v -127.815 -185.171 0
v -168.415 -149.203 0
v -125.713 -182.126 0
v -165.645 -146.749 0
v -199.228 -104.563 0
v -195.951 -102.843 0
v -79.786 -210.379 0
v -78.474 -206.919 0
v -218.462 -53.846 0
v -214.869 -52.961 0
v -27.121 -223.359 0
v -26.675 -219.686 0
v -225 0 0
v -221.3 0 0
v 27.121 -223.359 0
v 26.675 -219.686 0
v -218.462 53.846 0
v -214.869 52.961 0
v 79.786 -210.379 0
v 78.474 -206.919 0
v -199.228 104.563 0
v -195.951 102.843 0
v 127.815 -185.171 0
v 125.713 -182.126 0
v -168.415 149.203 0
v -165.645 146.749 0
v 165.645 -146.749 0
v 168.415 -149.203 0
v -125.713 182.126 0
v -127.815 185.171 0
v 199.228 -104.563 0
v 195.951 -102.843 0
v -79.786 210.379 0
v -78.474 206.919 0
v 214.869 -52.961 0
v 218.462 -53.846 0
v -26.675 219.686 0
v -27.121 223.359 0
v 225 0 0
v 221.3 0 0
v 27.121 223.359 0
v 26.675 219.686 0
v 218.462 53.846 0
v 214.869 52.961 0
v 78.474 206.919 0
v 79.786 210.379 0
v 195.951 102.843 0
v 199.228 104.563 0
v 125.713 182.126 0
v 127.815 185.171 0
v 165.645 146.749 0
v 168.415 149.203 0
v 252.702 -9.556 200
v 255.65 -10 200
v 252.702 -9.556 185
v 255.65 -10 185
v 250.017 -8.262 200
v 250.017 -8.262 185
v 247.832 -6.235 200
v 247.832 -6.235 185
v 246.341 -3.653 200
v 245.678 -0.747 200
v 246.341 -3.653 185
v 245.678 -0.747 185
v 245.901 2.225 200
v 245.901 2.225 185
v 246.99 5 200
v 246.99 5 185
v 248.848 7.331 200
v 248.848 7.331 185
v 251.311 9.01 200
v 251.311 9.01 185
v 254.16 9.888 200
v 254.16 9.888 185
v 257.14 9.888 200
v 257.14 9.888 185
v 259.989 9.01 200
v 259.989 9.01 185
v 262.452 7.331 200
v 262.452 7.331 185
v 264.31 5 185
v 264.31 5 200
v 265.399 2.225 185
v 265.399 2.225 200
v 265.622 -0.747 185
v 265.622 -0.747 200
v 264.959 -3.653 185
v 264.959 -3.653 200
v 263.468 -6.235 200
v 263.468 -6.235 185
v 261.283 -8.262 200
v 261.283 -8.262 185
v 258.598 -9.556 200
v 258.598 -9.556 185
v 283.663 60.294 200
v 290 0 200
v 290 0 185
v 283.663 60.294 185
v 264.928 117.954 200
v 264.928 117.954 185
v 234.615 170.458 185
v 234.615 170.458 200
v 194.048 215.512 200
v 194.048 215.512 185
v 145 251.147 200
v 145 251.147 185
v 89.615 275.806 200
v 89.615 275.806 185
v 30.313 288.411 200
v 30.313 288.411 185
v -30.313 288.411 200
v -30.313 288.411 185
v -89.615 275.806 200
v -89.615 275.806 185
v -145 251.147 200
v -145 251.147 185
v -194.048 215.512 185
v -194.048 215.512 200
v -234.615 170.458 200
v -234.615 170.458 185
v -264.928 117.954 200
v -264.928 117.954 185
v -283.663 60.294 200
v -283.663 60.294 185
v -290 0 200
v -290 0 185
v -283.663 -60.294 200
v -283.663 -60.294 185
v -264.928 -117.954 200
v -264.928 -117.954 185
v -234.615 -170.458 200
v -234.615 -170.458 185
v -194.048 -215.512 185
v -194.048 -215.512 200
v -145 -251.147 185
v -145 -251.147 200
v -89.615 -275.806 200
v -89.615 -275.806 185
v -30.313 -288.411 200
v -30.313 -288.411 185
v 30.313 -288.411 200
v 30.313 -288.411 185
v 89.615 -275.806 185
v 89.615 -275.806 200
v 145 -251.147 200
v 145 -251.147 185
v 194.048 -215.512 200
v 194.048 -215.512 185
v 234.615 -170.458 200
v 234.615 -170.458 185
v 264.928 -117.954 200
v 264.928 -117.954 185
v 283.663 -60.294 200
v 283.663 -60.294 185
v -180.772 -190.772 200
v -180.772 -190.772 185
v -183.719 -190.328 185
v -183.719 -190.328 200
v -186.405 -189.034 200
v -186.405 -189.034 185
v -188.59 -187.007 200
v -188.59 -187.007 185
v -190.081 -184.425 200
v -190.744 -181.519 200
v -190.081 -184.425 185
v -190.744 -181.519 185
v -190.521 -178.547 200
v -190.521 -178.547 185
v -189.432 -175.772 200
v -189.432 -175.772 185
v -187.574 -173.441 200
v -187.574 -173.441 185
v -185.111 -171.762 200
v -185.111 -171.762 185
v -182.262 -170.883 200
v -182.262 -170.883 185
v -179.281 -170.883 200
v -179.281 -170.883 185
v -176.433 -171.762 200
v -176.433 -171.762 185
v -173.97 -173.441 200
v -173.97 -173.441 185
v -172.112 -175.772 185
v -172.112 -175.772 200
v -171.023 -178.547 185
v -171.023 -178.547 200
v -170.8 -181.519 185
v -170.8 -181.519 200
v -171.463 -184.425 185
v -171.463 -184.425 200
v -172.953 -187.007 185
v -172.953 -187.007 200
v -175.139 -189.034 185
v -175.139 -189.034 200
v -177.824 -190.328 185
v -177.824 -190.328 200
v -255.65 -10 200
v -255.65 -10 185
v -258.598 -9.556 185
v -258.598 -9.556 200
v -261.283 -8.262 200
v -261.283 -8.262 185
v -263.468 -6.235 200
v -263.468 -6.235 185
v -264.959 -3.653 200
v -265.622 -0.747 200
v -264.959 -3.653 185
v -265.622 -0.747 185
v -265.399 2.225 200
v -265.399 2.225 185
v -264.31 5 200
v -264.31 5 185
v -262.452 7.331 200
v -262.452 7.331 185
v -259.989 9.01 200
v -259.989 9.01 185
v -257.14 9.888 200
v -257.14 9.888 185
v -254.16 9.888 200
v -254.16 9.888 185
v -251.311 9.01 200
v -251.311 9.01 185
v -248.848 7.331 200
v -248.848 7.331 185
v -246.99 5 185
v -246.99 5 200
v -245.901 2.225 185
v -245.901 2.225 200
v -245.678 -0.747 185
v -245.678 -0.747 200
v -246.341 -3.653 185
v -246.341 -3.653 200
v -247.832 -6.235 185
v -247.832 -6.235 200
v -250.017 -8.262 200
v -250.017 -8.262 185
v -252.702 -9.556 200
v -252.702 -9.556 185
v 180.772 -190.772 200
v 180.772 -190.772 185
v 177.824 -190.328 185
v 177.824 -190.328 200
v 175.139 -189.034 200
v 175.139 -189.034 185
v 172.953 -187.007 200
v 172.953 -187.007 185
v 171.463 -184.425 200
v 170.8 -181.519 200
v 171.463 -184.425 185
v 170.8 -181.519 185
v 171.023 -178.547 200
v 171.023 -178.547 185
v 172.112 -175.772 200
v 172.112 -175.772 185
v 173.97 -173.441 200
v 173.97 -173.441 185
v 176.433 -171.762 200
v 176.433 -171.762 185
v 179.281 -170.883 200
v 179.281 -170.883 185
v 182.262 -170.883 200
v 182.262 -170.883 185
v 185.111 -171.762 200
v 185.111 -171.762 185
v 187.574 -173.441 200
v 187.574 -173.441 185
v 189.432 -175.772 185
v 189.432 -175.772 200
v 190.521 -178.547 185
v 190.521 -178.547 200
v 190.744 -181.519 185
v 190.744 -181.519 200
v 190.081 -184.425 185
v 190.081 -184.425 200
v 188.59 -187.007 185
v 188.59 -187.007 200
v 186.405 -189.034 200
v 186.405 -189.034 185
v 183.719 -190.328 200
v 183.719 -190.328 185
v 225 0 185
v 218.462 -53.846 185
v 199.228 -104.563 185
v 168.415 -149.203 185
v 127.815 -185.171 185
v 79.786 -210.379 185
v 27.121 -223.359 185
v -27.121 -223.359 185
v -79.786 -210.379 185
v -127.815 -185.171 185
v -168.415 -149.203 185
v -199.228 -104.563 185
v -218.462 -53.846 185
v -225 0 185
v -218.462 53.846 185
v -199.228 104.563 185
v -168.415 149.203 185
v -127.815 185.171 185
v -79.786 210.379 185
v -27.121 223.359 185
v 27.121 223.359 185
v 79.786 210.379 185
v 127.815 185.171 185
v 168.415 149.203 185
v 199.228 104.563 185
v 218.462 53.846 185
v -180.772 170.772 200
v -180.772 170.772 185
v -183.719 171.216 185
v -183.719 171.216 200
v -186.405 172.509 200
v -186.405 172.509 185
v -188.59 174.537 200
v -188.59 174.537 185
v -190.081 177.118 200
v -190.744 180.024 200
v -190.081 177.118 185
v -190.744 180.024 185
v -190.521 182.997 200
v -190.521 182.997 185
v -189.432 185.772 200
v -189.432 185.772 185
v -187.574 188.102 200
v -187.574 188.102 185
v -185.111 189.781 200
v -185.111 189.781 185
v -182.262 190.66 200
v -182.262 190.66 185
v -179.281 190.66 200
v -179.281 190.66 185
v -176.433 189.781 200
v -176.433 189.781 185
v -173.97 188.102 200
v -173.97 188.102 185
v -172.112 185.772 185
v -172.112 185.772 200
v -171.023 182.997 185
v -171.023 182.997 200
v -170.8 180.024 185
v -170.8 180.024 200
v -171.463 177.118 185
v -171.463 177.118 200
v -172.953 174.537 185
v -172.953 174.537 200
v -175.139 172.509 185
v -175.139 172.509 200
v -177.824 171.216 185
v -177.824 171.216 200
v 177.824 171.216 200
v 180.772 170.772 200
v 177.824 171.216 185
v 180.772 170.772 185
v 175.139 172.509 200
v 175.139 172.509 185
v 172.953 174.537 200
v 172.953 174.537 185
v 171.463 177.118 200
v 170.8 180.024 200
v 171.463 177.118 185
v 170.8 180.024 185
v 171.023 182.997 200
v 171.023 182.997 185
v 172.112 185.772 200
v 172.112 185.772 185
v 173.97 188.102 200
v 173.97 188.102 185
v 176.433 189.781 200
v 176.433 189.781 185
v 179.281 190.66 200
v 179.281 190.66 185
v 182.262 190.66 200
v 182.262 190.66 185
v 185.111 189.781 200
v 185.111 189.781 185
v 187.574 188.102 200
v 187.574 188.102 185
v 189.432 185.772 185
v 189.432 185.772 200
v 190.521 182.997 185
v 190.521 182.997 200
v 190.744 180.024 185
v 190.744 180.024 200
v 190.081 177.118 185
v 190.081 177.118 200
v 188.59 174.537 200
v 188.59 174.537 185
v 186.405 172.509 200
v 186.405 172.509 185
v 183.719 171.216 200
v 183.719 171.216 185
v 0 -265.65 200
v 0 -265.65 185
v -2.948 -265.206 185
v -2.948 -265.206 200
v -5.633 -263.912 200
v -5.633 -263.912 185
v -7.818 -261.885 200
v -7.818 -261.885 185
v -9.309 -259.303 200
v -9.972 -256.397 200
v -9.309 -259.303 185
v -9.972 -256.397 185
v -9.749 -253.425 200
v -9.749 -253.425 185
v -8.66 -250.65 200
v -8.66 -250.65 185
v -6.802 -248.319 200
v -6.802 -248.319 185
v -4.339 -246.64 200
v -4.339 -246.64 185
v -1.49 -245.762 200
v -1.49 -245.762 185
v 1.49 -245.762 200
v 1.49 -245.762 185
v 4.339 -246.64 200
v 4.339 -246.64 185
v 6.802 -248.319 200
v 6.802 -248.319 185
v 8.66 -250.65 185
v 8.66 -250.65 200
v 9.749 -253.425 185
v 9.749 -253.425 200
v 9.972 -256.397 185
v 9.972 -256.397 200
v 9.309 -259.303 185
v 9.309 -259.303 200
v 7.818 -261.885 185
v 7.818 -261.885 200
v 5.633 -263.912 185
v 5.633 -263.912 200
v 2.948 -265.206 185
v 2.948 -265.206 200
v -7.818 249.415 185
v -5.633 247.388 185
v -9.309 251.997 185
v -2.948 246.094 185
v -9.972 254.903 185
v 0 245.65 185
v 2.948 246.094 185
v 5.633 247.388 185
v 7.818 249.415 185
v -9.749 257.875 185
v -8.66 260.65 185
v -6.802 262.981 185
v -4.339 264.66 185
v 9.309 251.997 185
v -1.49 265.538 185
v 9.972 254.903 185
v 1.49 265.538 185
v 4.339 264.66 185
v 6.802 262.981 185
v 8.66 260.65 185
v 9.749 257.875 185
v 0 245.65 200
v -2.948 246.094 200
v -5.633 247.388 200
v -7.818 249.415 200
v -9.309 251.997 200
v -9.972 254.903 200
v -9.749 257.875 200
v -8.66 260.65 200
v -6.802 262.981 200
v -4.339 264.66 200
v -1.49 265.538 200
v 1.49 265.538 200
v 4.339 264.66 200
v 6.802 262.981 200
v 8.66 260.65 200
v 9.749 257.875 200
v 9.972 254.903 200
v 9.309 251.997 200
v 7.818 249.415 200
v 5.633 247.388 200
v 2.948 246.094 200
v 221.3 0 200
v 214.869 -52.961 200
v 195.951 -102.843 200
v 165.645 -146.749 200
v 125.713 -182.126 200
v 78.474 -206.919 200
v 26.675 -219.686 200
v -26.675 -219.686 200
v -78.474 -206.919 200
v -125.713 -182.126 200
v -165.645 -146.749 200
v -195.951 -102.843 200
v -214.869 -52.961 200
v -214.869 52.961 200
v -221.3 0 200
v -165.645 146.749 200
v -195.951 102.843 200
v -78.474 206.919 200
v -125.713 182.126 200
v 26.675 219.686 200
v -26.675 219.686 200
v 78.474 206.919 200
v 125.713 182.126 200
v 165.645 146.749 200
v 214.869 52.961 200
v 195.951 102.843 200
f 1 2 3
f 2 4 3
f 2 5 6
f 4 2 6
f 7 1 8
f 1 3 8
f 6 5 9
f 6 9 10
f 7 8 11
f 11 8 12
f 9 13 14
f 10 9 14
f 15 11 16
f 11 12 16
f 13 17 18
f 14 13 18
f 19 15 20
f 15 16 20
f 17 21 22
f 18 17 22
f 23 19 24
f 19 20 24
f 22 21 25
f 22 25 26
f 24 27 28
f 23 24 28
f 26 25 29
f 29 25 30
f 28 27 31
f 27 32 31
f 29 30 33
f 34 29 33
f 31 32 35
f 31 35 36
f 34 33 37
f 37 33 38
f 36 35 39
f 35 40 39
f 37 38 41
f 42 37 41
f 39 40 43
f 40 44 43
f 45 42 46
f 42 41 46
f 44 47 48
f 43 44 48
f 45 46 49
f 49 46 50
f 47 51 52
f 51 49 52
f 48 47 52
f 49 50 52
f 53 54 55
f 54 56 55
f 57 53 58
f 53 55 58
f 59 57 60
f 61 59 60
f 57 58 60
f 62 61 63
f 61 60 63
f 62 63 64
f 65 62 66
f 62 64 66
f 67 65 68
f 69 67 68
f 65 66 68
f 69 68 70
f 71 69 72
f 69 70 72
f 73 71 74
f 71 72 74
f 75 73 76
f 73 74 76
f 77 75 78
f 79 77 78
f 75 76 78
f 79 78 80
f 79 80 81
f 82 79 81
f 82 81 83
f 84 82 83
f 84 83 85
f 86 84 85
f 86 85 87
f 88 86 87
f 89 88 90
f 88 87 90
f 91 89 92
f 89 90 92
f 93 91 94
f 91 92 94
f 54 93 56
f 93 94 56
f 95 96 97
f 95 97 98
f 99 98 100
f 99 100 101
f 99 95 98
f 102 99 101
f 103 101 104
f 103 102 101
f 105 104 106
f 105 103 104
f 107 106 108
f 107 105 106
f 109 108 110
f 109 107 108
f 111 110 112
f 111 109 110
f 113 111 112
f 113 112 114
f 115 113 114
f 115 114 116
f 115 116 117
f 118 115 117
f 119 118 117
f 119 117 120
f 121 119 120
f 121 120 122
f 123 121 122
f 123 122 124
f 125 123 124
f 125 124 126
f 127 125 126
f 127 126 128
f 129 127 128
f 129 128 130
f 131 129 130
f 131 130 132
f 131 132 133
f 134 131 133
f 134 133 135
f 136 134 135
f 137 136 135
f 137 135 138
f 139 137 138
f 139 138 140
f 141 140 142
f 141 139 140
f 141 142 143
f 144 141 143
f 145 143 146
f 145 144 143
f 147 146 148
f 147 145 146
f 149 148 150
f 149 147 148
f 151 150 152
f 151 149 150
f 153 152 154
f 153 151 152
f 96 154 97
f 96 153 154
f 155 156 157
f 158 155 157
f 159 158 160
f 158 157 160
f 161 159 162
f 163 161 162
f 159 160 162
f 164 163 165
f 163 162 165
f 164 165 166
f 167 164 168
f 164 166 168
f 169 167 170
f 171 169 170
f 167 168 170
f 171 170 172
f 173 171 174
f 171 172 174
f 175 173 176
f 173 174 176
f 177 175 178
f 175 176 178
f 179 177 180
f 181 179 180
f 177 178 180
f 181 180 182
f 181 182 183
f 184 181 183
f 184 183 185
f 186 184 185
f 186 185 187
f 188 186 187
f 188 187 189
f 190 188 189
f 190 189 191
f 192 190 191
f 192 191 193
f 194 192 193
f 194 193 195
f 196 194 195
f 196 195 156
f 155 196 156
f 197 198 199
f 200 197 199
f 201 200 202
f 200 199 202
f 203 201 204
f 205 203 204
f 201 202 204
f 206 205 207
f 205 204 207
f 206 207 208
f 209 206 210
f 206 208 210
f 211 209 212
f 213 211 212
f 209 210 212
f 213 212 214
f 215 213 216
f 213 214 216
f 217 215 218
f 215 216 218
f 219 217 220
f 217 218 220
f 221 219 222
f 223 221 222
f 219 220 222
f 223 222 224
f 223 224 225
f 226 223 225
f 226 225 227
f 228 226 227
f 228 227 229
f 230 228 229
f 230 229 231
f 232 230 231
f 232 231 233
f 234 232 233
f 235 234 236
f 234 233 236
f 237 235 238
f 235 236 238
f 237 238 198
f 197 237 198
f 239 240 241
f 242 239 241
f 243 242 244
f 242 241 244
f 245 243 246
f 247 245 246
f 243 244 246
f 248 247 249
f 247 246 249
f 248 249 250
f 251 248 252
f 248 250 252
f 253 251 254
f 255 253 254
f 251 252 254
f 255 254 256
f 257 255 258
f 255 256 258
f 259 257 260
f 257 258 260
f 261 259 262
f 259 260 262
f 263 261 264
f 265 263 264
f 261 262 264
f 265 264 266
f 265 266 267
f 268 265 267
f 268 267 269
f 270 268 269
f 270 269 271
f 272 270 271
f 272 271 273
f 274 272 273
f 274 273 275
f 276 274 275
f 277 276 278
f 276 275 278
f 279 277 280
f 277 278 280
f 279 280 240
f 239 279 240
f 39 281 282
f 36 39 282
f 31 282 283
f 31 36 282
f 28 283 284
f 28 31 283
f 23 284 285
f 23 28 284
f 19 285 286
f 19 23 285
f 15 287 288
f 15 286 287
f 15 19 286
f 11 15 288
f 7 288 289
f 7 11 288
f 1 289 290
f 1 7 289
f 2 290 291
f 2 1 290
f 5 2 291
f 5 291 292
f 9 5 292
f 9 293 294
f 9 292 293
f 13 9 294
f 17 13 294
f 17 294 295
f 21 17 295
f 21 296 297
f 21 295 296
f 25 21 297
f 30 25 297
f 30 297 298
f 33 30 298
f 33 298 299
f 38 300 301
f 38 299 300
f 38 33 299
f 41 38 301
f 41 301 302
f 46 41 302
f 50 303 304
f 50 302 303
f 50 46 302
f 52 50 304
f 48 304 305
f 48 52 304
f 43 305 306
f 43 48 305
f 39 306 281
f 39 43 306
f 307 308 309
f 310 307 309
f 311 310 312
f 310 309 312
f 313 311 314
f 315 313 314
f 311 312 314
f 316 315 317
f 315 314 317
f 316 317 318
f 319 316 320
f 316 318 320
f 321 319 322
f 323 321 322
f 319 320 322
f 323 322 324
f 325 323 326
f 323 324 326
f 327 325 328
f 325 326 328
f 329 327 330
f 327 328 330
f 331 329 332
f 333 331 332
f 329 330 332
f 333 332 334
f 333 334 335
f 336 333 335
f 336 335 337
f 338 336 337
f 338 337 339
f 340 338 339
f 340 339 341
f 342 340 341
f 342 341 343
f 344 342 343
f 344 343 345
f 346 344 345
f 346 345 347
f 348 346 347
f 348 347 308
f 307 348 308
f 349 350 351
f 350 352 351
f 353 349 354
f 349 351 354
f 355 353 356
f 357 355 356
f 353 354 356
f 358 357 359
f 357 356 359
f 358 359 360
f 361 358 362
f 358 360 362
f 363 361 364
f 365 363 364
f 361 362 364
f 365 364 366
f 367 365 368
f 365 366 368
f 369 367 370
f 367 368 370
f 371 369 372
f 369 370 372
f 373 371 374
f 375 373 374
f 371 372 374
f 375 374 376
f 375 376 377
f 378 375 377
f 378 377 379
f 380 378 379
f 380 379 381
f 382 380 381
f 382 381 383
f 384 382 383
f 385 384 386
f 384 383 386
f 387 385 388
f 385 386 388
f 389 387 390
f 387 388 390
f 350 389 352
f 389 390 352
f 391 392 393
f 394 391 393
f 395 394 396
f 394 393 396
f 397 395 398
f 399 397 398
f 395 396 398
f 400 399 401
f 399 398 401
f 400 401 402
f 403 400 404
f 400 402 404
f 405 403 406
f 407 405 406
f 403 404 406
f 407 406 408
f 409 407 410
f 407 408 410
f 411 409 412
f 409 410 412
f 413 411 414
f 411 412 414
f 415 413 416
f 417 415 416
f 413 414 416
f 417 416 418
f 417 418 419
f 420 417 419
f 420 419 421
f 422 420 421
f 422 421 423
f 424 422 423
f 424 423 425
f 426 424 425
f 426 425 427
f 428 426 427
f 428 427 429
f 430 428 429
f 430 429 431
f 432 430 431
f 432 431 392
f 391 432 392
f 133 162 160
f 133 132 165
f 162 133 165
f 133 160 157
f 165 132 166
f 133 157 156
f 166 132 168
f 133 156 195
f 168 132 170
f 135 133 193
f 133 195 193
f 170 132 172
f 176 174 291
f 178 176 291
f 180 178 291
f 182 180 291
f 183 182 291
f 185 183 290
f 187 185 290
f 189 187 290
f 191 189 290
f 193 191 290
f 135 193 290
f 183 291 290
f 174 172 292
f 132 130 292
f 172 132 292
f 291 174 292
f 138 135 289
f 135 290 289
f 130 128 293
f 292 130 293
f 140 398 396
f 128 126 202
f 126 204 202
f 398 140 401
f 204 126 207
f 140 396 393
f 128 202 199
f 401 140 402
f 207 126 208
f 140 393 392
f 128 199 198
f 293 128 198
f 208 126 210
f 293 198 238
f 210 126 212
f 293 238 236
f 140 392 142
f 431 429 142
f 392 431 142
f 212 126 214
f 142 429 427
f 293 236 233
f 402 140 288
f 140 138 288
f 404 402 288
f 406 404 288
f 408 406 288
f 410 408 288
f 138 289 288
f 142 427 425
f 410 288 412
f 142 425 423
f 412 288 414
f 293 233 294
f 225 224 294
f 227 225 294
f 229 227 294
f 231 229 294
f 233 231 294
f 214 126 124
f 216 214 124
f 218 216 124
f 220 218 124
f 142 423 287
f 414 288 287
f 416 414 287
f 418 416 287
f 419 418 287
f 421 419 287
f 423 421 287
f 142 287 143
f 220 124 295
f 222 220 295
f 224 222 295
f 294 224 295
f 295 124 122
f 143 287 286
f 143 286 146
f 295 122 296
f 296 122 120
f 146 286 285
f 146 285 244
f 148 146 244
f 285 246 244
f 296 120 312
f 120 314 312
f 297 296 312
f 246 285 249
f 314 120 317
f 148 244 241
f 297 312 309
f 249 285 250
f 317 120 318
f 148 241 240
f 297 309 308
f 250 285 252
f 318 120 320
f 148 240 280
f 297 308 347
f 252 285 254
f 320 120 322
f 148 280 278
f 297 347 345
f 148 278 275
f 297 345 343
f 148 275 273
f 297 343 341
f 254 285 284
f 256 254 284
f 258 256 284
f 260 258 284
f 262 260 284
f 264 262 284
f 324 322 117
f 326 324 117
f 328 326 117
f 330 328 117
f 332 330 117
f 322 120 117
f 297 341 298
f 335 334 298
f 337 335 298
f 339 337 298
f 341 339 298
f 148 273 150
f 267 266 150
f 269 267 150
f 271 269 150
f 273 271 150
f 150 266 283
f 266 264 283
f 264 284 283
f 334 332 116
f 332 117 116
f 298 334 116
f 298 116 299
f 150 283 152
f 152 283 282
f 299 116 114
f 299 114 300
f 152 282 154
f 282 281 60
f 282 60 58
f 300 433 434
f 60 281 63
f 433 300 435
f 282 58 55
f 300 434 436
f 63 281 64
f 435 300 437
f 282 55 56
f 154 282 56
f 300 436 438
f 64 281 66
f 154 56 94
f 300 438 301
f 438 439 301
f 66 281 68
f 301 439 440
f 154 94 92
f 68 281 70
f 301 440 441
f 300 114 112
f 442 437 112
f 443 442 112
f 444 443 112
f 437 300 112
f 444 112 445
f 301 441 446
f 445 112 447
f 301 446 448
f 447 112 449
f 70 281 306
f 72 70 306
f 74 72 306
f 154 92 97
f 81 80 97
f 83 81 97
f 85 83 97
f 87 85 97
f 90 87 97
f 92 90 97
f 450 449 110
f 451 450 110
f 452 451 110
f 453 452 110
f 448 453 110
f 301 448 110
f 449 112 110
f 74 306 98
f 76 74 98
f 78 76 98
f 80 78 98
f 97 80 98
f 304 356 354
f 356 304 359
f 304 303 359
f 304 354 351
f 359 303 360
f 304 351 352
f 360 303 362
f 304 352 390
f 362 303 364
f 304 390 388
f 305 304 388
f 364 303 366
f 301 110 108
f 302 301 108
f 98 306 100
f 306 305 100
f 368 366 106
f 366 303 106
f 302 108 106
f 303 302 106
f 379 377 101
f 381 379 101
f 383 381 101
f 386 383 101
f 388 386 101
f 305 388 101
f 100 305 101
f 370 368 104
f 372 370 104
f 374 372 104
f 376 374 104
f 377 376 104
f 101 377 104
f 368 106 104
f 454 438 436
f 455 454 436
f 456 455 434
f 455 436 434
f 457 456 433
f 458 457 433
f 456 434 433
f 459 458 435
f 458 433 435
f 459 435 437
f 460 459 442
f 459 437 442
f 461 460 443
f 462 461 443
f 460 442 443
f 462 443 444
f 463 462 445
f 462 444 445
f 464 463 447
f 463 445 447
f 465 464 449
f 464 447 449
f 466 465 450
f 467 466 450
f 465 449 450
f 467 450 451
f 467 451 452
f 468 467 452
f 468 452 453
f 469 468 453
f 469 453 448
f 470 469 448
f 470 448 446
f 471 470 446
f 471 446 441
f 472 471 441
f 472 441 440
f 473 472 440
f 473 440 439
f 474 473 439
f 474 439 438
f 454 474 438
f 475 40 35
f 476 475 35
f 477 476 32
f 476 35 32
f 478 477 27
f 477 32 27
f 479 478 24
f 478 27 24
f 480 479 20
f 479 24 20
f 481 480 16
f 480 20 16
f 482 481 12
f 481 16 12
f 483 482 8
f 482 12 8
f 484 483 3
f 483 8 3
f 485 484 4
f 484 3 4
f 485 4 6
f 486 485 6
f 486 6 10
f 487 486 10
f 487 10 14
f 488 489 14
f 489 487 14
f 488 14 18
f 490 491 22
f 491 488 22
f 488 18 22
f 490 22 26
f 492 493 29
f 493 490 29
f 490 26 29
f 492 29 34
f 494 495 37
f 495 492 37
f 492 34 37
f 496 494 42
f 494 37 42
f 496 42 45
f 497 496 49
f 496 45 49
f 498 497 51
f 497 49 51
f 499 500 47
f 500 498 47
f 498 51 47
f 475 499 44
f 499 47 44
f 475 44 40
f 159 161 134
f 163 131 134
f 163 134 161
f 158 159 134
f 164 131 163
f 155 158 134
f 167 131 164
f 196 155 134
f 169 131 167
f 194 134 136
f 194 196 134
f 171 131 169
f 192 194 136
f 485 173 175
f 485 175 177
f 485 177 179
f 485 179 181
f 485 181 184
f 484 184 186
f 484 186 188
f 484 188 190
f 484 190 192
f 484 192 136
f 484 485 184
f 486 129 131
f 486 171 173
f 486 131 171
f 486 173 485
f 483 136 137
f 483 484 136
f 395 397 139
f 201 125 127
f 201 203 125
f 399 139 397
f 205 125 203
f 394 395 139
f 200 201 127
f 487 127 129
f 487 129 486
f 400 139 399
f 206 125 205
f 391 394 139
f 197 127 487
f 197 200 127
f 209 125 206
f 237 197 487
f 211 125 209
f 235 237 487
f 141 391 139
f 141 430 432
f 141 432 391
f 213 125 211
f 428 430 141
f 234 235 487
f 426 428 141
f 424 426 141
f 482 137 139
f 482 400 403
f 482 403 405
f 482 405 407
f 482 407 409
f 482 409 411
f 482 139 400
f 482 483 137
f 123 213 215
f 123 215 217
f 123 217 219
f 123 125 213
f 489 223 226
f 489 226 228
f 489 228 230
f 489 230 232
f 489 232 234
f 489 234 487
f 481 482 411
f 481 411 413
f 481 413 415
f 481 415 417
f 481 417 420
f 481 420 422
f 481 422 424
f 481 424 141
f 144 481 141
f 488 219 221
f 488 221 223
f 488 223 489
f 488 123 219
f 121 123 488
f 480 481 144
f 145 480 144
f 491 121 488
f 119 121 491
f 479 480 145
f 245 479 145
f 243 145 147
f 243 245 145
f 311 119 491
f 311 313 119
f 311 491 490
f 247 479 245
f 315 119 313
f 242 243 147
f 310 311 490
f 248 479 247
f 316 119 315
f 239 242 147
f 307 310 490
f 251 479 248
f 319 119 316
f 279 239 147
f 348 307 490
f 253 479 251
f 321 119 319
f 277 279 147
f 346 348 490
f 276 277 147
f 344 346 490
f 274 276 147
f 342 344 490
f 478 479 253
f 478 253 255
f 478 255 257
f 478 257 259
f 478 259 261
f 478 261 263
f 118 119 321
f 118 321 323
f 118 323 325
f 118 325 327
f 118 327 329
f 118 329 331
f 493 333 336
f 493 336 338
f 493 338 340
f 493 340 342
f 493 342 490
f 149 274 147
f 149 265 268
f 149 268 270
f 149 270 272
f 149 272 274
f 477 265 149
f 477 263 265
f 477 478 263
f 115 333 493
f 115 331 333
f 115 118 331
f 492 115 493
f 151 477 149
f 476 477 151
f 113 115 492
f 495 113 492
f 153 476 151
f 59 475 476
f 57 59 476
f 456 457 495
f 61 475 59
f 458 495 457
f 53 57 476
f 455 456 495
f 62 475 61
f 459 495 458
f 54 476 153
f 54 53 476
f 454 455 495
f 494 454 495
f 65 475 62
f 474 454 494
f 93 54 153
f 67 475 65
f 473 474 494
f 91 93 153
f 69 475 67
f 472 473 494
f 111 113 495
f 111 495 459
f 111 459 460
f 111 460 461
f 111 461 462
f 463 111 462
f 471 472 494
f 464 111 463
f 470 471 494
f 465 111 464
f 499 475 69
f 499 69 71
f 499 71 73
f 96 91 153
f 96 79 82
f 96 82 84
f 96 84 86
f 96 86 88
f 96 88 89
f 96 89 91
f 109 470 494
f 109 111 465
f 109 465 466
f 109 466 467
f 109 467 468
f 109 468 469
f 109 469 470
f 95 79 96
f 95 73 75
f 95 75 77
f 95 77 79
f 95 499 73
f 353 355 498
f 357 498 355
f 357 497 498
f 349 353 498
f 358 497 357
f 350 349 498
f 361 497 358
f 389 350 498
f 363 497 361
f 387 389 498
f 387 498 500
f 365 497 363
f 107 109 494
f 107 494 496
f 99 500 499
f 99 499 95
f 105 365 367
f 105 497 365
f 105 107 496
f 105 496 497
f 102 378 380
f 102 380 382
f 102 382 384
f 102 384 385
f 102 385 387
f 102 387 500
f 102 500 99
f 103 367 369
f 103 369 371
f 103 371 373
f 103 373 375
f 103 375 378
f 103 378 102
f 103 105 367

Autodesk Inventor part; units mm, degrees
ref_plane "YZ Plane" through (0, 0, 0) normal (1, 0, 0) x (0, 1, 0)
ref_plane "XZ Plane" through (0, 0, 0) normal (0, 1, 0) x (-1, 0, 0)
ref_plane "XY Plane" through (0, 0, 0) normal (0, 0, 1) x (1, 0, 0)
sketch "草图1" plane through (0, 0, 0) normal (0, 0, 1) x (1, 0, 0)
  circle A0 centre (0, 0) radius 225
  dimension "d0" = 450
surface extrude "拉伸曲面1" sketch "草图1" along normal blind 200 shown no curves A0
thicken "加厚1" operation new thickness 3.7 both sides no extend neighbours no toward (-0.4864037, 0.8737342, 0) faces at (109.4408, -196.5902, 133.3333)
sketch "草图2" plane through (0, 0, 200) normal (0, 0, 1) x (1, 0, 0)
  circle A0 centre (0, 0) radius 225 projected
  circle A1 centre (0, 0) radius 221.3 projected
  circle A2 centre (0, 0) radius 290
  dimension "d18" = 580
  dimension "d19" = 442.6
  dimension "d20" = 450
extrude "拉伸1" add sketch "草图2" against normal blind 15 contours A2
sketch "草图3" plane through (0, 0, 200) normal (0, 0, 1) x (1, 0, 0)
  circle A0 centre (0, 0) radius 290 projected
  circle A1 centre (0, 0) radius 221.3 projected
  line L0 (0, -221.3) -> (0, -290)
  point P0 (0, -255.65)
  point P1 (180.7718, -180.7718)
  point P2 (255.65, 0)
  point P3 (180.7718, 180.7718)
  point P4 (0, 255.65)
  point P5 (-180.7718, 180.7718)
  point P6 (-255.65, 0)
  point P7 (-180.7718, -180.7718)
  dimension "d9" = 360
  dimension "d21" = 255.65
hole "孔1" at (0, -255.65, 200) at (180.7718, -180.7718, 200) at (255.65, 0, 200) at (180.7718, 180.7718, 200) at (0, 255.65, 200) at (-180.7718, 180.7718, 200) at (-255.65, 0, 200) at (-180.7718, -180.7718, 200) direction (0, 0, -1) diameter 20 end through all
sketch "草图4" plane through (0, 0, 0) normal (1, 0, 0) x (0, 1, 0)
  line L0 (-225, 185) -> (225, 185) projected
  line L1 (225, 0) -> (-225, 0) projected
  line L2 (225, 0) -> (-225, 0) projected
  line L3 (-225, 0) -> (225, 92.5)
  line L4 (225, 0) -> (225, 185) projected
  point P0 (0, 0)
extrude "拉伸2" [suppressed]
properties part number "人孔"
